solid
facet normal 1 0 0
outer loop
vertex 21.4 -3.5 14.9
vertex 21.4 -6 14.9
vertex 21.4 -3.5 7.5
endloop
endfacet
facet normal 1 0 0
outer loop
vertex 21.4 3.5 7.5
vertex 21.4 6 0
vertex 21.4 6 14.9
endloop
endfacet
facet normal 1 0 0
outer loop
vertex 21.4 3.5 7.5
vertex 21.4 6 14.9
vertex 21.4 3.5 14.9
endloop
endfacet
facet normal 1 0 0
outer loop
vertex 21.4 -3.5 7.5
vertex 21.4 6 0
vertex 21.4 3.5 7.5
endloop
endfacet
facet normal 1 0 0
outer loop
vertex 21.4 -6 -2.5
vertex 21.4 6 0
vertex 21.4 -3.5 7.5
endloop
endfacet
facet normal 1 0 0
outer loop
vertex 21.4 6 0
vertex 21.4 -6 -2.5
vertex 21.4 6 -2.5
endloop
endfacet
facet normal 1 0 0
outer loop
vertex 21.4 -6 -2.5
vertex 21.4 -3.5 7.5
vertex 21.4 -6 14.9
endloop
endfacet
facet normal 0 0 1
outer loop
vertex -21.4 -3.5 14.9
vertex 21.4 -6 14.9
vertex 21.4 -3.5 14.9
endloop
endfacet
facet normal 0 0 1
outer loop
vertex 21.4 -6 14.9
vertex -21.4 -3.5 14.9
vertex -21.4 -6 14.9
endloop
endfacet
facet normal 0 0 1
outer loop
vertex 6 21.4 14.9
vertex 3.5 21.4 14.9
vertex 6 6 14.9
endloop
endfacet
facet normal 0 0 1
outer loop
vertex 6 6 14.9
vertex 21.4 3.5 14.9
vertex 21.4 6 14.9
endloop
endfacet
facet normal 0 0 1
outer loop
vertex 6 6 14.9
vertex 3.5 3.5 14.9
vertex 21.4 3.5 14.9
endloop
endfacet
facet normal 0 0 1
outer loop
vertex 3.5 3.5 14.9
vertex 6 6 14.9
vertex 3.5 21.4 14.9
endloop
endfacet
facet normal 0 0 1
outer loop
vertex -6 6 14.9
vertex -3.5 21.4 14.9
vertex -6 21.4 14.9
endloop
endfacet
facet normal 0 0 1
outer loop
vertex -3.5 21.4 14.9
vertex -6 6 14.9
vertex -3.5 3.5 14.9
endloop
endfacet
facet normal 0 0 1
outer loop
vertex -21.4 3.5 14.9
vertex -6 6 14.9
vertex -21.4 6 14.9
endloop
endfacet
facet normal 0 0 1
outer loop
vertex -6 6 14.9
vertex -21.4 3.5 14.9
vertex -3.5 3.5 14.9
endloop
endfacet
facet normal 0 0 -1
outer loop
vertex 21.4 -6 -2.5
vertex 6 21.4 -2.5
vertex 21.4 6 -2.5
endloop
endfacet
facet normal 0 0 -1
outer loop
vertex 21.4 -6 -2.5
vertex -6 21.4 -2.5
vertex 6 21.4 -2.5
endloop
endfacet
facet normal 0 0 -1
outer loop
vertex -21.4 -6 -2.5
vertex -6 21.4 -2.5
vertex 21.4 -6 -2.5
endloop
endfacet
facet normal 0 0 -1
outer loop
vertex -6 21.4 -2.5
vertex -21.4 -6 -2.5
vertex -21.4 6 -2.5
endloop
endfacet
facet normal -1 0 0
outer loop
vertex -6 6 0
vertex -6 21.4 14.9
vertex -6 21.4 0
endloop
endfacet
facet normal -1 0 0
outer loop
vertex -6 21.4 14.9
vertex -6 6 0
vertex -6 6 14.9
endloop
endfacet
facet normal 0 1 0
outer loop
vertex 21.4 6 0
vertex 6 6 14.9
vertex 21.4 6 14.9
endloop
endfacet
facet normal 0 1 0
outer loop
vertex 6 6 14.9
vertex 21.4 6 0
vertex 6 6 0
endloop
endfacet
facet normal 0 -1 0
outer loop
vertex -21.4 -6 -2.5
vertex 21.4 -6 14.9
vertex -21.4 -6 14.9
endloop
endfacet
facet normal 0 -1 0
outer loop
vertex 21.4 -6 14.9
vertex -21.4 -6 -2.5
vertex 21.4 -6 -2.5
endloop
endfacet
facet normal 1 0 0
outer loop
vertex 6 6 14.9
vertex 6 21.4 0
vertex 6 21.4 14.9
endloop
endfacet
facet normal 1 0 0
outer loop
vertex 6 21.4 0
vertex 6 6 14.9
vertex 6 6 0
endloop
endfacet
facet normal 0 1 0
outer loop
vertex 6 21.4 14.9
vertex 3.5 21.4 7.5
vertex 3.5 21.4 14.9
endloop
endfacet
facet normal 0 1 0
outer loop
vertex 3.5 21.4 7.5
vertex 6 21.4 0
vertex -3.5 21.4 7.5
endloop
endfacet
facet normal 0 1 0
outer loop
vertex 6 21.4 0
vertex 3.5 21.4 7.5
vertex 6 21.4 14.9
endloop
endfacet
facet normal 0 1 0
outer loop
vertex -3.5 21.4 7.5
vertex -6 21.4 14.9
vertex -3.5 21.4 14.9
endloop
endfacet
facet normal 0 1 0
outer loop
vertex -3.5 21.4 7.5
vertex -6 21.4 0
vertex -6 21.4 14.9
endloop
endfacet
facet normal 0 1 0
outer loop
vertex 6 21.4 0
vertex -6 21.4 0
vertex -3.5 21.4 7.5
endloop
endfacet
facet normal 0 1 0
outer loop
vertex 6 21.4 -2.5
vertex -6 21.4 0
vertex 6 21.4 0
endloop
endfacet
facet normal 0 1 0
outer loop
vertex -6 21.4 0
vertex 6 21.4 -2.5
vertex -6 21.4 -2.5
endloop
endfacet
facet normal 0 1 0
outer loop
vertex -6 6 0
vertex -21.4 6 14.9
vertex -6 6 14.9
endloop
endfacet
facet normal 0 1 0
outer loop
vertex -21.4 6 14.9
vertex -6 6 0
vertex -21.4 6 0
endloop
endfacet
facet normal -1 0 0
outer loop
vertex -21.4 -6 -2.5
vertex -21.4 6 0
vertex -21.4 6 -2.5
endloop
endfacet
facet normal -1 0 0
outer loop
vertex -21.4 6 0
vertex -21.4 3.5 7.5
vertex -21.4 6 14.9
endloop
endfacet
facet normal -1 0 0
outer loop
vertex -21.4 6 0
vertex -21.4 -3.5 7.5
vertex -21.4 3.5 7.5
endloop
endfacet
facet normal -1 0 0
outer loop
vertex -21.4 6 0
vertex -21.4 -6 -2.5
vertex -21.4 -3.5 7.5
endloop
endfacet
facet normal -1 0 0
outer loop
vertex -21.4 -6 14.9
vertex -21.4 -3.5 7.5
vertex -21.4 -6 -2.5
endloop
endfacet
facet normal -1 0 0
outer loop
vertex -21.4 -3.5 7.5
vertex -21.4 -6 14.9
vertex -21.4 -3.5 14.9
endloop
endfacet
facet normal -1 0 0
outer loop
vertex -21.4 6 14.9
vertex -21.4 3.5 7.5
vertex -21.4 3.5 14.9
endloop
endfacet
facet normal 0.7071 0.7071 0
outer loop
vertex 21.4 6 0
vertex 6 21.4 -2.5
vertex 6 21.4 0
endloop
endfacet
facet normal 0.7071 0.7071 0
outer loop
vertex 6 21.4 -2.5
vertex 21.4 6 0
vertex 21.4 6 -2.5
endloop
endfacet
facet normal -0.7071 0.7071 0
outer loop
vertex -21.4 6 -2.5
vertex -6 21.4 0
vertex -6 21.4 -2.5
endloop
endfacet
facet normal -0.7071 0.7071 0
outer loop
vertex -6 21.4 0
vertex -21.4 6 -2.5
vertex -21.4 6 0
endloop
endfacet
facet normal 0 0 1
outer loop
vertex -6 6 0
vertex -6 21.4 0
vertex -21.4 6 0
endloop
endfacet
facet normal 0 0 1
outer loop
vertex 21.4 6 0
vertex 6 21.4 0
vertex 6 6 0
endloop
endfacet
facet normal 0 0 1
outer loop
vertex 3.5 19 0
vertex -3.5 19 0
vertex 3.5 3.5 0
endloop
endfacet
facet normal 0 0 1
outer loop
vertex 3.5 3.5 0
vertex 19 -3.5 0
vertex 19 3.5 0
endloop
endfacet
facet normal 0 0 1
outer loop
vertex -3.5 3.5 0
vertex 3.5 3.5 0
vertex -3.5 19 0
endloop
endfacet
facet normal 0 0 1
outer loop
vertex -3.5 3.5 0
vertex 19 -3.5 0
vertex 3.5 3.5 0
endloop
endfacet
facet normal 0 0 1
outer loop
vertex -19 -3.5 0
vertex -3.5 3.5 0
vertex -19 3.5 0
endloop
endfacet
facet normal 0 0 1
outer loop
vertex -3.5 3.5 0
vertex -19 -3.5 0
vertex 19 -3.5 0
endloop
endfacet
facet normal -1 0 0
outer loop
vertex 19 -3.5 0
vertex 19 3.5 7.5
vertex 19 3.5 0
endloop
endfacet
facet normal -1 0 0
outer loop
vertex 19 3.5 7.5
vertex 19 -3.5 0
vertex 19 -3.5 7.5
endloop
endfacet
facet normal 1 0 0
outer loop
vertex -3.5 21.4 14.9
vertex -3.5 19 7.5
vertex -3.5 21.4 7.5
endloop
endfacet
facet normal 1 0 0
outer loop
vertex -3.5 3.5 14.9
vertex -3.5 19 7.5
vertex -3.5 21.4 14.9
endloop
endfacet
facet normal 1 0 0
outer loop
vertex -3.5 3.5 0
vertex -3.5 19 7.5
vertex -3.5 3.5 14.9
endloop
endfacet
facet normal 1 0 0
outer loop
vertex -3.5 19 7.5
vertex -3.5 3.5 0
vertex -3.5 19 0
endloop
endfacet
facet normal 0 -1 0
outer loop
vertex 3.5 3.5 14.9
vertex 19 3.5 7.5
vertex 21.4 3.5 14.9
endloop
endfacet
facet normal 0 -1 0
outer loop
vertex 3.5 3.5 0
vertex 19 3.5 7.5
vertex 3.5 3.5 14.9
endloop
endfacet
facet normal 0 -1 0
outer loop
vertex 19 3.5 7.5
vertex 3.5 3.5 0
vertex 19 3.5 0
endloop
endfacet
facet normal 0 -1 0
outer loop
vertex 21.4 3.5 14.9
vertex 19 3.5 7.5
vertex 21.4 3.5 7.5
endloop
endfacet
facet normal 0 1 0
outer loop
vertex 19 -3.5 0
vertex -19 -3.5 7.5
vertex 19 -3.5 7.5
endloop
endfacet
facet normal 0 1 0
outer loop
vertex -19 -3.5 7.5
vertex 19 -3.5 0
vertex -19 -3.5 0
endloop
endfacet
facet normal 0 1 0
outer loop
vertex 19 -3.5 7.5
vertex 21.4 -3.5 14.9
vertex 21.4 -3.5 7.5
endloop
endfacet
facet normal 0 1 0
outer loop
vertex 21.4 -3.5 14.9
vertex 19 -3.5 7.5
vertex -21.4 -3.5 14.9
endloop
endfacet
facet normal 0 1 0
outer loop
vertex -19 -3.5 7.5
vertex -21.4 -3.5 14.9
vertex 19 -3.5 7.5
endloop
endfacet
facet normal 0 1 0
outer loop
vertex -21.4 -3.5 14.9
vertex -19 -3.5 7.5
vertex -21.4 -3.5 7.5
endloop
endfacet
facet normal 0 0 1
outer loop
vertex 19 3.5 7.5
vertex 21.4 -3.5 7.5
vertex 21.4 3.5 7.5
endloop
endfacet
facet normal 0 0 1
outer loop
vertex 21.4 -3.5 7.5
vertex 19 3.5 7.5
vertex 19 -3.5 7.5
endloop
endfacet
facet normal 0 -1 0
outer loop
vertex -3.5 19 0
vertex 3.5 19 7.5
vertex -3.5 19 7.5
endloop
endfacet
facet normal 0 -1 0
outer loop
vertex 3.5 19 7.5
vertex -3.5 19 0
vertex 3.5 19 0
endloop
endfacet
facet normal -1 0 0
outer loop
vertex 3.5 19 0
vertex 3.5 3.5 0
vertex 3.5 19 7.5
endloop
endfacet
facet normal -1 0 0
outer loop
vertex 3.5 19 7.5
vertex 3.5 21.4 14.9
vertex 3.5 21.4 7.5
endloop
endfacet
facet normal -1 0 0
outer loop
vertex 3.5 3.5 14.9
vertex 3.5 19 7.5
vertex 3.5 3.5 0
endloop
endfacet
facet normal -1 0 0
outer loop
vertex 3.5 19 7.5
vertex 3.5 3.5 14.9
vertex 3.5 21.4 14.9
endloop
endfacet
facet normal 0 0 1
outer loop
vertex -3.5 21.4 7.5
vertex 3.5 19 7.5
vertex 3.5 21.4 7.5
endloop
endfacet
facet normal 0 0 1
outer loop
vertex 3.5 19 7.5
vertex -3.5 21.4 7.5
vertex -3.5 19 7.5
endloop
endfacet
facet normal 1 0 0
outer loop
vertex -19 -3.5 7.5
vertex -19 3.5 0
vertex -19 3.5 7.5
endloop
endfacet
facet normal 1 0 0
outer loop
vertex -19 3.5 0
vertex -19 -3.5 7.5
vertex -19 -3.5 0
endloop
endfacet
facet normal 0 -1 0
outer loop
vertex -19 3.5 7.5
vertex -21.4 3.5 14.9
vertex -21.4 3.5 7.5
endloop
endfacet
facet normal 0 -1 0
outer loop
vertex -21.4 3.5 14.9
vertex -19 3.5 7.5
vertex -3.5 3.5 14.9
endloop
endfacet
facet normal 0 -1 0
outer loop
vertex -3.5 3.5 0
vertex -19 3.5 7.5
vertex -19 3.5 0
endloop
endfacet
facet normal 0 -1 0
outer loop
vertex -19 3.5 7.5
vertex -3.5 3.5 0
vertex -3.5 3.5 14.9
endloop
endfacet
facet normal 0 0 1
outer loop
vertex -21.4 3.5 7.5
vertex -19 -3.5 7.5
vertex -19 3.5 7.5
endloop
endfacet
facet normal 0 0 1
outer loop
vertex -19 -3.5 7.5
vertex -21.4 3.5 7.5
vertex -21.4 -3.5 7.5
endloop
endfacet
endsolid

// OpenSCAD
base = 2.5;
length = 25.0;
width = 7.0;
height = 15.0;
wall = 2.5;



channel = [length, width, height];
shell = channel+[wall-0.1, wall*2, base-0.1];
channel_offset = [-width/2, -width/2, 0];
shell_offset = channel_offset - [wall, wall, base];

module outer() {
    translate(shell_offset) {
        difference() {
            cube(shell);
        }
    }
}

module inner() {
    translate(channel_offset) {
        cube(channel-[wall,0,0]);
        translate([0,0,height/2]) 
            cube(channel);
    }
}


module rotater(angles) {
    for (a = angles) {
        rotate([0,0,a]) children(0);
    }    
}

module create(angles) {
    difference() {
        hull() rotater(angles) outer();
        cylinder(h=height*2, r=length*2);
    }    
    difference() {
        rotater(angles) outer();
        rotater(angles) inner();
    }
}

//L-shape
//create([0, 90]);
//T-shape
create([0,90,180]);
//I-shape
//create([0,180]);
